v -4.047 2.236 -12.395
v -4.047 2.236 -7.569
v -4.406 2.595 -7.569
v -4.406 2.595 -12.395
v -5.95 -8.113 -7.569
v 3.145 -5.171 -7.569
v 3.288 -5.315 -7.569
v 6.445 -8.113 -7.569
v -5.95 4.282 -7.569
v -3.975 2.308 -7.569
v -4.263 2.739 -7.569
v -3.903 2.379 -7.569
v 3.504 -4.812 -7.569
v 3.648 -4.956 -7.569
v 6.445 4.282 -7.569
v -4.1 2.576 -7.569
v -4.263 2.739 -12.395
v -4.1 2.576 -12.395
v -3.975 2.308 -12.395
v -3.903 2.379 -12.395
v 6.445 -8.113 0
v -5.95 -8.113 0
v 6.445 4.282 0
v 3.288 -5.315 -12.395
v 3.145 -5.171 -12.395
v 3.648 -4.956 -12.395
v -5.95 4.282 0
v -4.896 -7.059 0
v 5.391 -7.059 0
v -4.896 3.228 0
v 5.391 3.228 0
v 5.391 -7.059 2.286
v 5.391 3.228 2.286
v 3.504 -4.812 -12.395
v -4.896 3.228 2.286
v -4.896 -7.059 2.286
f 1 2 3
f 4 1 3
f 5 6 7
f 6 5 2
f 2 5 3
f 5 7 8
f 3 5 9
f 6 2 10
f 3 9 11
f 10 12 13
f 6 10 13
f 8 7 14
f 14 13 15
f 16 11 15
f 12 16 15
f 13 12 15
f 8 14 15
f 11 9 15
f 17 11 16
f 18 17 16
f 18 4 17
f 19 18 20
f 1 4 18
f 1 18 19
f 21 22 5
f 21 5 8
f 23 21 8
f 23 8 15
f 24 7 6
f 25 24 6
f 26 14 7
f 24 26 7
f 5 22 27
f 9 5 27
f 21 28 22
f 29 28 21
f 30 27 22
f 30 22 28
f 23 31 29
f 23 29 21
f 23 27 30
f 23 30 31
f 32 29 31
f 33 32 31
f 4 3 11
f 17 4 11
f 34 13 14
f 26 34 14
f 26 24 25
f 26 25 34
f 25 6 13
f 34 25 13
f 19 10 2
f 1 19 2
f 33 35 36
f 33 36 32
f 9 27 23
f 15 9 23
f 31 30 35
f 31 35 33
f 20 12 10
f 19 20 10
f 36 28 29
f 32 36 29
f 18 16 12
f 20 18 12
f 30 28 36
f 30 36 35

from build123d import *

# Parameters (mm, degrees)
F0_W     = 12.3952
F0_H     = 12.3952
F0_W_2   = 10.287
F0_H_2   = 10.287
F1_DEPTH = 7.5692
F2_DEPTH = 2.286
F4_DEPTH = 4.826


with BuildPart() as f1:
    # F0 (on Top) → F1 (new body)
    with BuildSketch(Plane.XY):
        with Locations((0.247709, -1.915304)):
            Rectangle(F0_W, F0_H)
        with Locations((0.247709, -1.915304)):
            Rectangle(F0_W_2, F0_H_2, mode=Mode.SUBTRACT)
        with Locations((0.247709, -1.915304)):
            Rectangle(F0_W_2, F0_H_2)
    extrude(amount=-F1_DEPTH)

    # F0 (on Top) → F2 (join)
    with BuildSketch(Plane.XY):
        with Locations((0.247709, -1.915304)):
            Rectangle(F0_W_2, F0_H_2)
    extrude(amount=F2_DEPTH)

    # F3 (on face) → F4 (join)
    with BuildSketch(Plane(origin=(0, 0, -7.5692), x_dir=(1, 0, 0), z_dir=(0, 0, -1))):
        Polygon((-4.40624, -2.594961), (-4.334398, -2.666803), (-4.171967, -2.504372), (-4.243809, -2.43253), align=None)
        Polygon((-4.171967, -2.504372), (-4.334398, -2.666803), (-4.262556, -2.738645), (-4.100125, -2.576214), align=None)
        Polygon((-4.171967, -2.504372), (-4.100125, -2.576214), (-3.903345, -2.379435), (-3.975187, -2.307593), align=None)
        Polygon((-4.047029, -2.23575), (-4.243809, -2.43253), (-4.171967, -2.504372), (-3.975187, -2.307593), align=None)
        Polygon((3.467957, 5.135552), (3.288352, 5.315157), (3.144668, 5.171473), (3.324273, 4.991868), align=None)
        Polygon((3.503878, 4.812263), (3.647562, 4.955947), (3.467957, 5.135552), (3.324273, 4.991868), align=None)
    extrude(amount=F4_DEPTH)


solid = f1.part
